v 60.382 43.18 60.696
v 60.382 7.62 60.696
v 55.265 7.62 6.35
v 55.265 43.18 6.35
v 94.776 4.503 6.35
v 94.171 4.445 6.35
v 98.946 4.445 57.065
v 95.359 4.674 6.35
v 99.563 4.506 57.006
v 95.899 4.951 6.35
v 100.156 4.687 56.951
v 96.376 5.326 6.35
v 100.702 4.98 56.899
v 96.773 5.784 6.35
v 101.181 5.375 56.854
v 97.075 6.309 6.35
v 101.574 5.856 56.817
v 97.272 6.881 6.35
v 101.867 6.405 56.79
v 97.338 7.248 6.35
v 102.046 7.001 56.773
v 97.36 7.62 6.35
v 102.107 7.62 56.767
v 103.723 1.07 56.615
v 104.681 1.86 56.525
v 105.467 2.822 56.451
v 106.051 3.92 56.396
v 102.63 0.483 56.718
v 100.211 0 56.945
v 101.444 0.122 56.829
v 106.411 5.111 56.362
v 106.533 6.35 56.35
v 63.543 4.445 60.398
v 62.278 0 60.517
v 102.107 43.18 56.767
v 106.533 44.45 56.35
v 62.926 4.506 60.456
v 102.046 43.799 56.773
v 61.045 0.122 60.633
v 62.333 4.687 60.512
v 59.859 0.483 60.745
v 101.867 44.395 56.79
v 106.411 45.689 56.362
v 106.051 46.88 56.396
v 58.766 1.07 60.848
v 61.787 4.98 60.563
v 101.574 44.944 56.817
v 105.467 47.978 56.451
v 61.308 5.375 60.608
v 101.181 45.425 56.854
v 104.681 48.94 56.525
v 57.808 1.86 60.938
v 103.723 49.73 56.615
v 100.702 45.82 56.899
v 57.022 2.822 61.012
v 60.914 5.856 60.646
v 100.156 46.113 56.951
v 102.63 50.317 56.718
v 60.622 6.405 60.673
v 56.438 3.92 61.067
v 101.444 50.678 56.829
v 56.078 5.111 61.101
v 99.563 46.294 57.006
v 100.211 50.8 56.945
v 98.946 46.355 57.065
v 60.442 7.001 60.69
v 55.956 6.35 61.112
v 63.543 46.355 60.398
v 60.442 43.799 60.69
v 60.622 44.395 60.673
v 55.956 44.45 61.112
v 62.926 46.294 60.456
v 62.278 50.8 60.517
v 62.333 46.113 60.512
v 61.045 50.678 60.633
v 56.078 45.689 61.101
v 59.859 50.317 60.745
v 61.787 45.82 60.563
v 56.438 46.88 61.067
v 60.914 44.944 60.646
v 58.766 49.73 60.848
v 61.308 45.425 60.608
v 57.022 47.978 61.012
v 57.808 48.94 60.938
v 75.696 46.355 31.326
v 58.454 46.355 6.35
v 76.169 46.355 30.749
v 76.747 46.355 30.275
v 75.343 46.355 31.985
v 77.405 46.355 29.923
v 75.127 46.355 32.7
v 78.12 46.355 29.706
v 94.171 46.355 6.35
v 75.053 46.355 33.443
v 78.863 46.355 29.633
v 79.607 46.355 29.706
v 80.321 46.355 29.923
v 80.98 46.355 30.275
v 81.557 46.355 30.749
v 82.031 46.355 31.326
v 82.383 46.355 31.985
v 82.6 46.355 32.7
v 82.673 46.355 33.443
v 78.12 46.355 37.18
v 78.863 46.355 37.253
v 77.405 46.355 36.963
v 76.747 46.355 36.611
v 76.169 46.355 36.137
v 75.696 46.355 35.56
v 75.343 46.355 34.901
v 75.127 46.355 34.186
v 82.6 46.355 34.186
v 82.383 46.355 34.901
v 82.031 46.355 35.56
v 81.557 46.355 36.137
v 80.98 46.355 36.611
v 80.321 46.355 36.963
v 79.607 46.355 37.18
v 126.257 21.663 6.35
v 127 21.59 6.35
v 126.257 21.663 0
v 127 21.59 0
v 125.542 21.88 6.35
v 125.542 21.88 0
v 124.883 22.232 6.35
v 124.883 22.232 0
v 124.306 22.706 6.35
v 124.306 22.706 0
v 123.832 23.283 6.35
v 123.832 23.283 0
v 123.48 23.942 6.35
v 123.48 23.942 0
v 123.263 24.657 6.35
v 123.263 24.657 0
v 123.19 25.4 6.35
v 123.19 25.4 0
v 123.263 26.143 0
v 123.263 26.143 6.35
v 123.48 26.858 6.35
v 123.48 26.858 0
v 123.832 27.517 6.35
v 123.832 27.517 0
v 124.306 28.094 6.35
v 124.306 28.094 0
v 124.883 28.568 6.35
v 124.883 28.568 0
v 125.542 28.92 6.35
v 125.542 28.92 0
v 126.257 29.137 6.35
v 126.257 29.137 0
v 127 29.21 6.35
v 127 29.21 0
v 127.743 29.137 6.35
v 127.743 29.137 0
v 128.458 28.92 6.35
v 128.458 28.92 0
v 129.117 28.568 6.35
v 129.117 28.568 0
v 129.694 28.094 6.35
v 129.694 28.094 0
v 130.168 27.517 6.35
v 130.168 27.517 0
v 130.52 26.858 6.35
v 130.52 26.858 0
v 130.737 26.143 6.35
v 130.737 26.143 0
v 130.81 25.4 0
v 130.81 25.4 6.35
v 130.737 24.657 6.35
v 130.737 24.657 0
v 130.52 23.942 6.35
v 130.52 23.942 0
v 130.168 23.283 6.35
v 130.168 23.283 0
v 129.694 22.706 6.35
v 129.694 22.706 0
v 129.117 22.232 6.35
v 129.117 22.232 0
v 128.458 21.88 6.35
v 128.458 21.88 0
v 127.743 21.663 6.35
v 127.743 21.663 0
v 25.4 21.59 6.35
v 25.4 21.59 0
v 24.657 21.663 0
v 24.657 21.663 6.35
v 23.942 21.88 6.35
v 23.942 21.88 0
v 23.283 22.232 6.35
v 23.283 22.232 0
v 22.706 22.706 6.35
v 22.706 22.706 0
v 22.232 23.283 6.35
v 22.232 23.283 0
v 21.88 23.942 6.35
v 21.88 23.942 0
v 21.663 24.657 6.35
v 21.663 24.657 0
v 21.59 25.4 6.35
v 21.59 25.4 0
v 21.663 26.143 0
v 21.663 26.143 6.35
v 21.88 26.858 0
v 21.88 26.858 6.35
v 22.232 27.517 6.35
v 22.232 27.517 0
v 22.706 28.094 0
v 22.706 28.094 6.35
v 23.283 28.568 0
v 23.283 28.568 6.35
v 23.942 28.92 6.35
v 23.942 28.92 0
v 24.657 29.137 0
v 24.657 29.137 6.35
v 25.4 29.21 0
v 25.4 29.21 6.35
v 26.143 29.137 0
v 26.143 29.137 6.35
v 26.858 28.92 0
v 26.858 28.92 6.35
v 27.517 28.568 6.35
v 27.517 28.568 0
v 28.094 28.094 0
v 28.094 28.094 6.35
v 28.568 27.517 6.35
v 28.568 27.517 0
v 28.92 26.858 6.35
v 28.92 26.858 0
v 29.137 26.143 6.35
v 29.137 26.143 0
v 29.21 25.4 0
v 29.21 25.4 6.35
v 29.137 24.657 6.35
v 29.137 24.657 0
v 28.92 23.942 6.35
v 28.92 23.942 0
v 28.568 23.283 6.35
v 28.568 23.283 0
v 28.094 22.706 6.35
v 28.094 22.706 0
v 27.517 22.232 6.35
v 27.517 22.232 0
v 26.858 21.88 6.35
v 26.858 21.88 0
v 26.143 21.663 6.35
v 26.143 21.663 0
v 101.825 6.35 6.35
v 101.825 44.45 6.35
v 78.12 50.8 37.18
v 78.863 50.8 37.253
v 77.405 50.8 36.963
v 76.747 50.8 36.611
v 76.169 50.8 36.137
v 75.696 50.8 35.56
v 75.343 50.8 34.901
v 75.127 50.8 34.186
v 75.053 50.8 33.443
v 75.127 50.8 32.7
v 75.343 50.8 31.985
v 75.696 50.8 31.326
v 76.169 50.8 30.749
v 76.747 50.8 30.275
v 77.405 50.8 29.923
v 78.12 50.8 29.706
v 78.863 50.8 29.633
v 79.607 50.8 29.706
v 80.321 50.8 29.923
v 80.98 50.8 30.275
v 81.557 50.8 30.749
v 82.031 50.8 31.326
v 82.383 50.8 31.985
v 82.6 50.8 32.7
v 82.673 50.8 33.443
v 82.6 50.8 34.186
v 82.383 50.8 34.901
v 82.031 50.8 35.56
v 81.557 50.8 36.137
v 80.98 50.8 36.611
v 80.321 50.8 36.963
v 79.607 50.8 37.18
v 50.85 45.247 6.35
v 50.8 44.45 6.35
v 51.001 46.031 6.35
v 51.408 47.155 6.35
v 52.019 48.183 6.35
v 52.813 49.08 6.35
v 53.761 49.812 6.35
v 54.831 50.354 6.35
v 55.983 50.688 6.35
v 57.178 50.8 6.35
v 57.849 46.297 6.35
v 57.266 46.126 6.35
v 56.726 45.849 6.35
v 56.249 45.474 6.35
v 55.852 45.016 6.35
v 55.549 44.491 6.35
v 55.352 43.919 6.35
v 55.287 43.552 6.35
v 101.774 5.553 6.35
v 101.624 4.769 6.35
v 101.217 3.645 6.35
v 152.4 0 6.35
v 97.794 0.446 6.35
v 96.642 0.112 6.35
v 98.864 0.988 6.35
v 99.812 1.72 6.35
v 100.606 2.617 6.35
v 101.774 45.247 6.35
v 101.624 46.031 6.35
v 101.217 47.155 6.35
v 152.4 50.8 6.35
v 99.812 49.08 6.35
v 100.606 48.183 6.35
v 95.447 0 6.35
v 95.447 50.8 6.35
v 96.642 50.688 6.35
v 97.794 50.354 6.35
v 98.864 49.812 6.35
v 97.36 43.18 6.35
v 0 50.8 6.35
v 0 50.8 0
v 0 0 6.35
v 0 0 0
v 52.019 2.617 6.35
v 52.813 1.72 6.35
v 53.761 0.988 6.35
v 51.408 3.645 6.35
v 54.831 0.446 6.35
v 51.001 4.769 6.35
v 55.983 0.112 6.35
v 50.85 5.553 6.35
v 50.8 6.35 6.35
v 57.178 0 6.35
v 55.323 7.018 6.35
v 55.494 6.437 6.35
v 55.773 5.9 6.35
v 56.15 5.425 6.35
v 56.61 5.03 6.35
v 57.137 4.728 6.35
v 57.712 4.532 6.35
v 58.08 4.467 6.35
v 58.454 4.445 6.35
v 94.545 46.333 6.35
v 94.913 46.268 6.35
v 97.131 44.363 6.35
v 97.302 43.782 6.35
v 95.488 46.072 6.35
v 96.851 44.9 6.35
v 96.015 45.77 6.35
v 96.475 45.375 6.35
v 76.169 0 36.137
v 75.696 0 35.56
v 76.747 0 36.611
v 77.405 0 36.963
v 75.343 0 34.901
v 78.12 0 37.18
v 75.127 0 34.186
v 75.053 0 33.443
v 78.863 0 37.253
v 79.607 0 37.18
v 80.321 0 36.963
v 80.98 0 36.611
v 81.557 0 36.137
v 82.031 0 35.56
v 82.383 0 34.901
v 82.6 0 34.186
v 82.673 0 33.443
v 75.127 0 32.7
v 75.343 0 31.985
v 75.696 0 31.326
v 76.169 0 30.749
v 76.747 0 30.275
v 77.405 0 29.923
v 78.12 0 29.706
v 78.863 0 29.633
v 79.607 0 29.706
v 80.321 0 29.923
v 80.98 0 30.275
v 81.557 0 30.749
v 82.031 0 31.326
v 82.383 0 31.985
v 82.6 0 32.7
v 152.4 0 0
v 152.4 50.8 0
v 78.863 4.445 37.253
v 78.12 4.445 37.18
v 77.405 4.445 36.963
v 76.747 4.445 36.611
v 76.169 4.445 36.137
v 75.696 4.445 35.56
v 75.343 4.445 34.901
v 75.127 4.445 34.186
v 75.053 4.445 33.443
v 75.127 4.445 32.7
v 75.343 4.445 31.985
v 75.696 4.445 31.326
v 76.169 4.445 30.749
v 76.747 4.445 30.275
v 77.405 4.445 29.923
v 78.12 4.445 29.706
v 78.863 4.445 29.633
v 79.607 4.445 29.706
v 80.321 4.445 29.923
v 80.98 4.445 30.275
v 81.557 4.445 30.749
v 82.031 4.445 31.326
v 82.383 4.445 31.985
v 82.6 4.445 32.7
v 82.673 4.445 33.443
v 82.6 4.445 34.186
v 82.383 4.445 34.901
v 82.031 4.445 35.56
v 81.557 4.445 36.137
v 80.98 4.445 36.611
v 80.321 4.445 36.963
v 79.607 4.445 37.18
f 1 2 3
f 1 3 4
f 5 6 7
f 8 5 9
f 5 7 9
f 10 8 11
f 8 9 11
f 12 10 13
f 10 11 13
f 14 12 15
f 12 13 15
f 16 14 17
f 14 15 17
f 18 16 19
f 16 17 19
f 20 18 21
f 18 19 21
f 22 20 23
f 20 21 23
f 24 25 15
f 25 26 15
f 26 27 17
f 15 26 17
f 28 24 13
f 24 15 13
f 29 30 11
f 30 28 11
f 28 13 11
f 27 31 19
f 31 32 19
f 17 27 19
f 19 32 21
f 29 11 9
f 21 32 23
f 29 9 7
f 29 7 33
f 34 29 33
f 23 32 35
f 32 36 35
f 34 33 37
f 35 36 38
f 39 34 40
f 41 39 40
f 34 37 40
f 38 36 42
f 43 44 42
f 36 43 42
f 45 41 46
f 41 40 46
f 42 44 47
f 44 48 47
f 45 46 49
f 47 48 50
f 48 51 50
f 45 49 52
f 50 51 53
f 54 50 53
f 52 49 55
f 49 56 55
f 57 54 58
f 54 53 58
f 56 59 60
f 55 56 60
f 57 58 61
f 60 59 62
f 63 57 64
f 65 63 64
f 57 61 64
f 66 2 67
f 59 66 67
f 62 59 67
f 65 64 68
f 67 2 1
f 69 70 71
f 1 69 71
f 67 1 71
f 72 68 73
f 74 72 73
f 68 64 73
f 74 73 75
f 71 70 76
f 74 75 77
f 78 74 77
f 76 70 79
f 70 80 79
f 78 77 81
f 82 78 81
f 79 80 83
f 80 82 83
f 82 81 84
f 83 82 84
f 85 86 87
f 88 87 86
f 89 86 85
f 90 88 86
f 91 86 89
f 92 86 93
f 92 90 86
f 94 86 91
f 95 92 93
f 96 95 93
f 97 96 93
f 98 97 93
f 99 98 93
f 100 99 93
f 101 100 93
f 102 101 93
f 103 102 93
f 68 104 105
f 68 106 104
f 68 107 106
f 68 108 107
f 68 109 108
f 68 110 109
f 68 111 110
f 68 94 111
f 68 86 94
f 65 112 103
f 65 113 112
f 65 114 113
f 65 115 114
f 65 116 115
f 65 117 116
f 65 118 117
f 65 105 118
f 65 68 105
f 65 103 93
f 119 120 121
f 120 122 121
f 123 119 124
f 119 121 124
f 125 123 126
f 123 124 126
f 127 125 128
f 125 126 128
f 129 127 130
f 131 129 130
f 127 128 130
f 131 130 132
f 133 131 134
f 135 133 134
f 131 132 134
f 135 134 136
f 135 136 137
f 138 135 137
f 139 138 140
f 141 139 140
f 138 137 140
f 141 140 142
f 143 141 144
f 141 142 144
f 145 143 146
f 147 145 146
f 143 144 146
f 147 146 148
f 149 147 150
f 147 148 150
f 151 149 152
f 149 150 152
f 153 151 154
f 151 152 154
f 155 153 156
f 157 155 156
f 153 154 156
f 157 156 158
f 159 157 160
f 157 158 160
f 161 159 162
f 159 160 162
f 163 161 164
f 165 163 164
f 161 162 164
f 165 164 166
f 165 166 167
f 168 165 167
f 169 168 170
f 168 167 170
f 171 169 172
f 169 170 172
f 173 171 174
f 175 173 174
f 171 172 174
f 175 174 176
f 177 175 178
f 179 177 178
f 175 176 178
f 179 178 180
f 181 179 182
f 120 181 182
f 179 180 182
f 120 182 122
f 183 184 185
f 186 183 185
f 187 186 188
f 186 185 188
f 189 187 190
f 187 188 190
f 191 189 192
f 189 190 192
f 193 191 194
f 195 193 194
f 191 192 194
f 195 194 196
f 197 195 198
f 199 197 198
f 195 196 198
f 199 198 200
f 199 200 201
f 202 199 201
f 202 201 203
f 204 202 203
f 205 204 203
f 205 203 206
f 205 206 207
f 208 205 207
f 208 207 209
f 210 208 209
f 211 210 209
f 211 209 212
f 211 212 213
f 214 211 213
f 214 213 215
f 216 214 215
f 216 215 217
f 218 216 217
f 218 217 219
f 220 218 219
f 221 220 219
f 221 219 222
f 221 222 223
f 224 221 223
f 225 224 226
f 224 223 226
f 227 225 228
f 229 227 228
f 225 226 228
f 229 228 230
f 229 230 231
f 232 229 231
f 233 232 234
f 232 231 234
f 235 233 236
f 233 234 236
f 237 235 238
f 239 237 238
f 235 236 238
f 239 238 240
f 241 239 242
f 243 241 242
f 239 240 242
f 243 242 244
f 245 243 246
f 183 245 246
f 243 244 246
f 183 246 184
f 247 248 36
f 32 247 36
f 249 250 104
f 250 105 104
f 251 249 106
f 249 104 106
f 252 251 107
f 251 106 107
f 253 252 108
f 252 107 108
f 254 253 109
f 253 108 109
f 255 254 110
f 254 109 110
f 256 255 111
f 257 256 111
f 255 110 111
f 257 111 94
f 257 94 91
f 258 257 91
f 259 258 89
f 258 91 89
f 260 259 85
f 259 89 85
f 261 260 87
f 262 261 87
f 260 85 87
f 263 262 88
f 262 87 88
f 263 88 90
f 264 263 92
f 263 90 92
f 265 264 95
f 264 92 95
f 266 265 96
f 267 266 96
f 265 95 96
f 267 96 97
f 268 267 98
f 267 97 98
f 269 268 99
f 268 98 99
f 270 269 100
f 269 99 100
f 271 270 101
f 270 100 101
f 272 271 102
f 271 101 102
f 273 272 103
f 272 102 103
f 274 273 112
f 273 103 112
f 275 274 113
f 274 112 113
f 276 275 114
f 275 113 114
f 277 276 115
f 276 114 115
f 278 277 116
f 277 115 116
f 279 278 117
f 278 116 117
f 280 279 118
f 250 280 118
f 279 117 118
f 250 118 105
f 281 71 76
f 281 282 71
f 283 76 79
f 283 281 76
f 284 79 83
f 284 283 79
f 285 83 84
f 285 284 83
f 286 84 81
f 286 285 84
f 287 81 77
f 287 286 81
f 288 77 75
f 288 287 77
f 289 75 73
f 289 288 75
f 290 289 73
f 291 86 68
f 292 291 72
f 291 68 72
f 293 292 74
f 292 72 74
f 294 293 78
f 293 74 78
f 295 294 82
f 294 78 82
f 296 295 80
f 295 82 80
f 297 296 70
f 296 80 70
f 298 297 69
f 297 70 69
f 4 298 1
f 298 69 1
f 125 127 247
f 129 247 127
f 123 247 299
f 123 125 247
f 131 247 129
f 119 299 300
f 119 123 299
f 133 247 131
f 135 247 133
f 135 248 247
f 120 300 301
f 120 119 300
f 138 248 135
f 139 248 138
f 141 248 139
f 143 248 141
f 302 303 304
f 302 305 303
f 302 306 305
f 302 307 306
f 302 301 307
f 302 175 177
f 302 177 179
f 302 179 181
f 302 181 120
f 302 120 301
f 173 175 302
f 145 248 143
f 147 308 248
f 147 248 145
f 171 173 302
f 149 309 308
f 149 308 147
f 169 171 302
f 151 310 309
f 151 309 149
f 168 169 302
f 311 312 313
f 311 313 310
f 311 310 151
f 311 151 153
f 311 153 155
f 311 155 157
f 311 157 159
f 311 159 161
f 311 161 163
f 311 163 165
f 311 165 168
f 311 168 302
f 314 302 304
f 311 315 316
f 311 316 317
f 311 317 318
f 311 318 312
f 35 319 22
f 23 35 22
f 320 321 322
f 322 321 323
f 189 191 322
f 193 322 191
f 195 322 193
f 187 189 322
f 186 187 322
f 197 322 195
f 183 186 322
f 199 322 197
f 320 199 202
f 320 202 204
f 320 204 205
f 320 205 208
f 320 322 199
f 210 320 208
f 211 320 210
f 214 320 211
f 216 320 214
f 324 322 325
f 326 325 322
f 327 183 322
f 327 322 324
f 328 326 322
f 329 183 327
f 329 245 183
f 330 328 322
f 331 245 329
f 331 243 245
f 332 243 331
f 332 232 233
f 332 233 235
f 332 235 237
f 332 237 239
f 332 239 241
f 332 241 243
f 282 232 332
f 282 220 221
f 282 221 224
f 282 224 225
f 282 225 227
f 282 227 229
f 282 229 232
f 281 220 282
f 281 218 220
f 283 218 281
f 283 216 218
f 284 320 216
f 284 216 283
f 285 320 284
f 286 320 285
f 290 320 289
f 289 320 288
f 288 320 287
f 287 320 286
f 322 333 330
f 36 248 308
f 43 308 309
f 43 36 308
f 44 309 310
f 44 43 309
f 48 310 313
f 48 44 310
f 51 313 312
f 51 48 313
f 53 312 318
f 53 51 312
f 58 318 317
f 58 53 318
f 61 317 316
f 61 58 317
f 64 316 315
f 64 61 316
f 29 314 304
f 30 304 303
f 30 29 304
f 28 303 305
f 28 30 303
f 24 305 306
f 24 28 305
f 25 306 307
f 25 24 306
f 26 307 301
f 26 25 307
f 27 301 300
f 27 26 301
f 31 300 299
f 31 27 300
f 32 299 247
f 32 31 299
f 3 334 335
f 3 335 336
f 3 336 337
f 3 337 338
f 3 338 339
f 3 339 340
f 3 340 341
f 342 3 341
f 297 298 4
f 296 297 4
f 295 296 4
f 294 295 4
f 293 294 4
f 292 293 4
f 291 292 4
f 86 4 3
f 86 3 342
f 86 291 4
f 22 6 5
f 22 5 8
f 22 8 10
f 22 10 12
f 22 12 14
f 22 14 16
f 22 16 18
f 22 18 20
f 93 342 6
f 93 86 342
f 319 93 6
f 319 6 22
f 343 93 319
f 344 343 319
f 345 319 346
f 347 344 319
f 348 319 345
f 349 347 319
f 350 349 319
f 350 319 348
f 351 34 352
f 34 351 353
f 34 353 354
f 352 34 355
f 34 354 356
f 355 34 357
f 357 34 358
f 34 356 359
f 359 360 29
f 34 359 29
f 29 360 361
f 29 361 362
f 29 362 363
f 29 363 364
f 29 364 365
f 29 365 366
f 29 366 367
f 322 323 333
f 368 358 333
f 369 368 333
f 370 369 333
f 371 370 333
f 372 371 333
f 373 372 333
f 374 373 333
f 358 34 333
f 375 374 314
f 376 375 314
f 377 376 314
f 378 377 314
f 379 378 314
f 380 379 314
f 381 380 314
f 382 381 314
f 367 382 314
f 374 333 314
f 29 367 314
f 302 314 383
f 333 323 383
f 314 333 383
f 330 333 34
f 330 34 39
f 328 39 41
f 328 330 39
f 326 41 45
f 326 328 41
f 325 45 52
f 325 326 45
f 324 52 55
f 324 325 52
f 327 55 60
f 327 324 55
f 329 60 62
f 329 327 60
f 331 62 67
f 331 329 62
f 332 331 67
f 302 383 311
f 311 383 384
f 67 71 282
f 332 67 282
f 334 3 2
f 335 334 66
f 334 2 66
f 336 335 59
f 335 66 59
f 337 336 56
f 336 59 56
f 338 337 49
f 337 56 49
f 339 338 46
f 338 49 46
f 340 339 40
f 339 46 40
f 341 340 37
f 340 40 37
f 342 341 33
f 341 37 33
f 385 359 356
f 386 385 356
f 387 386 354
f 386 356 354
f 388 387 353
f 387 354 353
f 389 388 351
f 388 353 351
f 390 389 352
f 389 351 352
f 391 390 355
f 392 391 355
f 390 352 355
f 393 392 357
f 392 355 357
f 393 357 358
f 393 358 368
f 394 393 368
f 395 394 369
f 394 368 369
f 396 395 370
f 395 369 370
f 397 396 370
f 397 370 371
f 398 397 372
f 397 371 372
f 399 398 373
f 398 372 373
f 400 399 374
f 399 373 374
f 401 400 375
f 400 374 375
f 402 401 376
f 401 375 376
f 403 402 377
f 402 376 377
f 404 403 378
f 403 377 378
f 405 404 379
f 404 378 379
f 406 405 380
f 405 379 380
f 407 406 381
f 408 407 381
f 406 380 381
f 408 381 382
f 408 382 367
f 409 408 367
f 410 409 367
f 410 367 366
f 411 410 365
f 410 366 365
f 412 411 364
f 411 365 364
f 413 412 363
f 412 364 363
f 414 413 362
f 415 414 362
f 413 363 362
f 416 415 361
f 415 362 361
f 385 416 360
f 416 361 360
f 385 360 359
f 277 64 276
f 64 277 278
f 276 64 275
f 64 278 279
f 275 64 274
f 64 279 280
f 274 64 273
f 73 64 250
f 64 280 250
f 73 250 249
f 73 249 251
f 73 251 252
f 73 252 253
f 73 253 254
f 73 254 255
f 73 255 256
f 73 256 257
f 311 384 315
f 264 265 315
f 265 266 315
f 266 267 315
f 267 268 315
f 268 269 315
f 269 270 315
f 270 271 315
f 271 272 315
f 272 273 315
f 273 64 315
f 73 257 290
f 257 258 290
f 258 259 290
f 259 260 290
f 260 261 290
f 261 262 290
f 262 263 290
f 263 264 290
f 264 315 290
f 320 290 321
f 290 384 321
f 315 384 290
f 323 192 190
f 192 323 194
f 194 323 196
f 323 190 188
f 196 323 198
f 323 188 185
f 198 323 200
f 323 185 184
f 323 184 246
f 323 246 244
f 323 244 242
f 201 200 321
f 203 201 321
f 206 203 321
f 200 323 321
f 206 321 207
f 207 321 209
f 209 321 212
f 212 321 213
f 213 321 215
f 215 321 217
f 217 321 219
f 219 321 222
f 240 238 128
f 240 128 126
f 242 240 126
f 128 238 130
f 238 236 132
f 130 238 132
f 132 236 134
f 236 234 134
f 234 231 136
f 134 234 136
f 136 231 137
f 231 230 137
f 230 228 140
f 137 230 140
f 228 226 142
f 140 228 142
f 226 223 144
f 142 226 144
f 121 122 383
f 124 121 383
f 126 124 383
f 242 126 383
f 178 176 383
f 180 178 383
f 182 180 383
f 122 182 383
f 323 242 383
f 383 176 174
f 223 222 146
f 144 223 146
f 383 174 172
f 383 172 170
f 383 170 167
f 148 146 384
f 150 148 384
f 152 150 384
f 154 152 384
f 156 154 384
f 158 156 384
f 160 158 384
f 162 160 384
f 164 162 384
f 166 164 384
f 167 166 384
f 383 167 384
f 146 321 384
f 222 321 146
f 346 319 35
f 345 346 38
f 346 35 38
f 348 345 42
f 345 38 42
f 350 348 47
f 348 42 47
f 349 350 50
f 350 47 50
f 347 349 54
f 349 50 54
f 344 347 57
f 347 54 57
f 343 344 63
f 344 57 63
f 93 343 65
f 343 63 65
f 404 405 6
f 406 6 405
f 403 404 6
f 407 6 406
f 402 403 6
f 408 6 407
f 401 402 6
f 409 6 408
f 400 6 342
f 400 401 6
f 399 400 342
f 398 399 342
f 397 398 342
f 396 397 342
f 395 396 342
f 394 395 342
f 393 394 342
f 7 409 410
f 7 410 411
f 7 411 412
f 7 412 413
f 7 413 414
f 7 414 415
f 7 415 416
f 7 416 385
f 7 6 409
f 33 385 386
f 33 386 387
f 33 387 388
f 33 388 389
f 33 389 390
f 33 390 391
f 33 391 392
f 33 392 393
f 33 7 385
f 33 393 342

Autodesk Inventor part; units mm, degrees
ref_plane "YZ Plane" through (0, 0, 0) normal (1, 0, 0) x (0, 1, 0)
ref_plane "XZ Plane" through (0, 0, 0) normal (0, 1, 0) x (-1, 0, 0)
ref_plane "XY Plane" through (0, 0, 0) normal (0, 0, 1) x (1, 0, 0)
sketch "Sketch1" plane through (0, 0, 0) normal (0, 0, 1) x (1, 0, 0)
  line L0 (0, 0) -> (152.4, 0)
  line L1 (152.4, 0) -> (152.4, 50.8)
  line L2 (152.4, 50.8) -> (0, 50.8)
  line L3 (0, 50.8) -> (0, 0)
  dimension "d0" = 50.8
  dimension "d1" = 152.4
extrude "Extrusion1" add sketch "Sketch1" along normal blind 6.35
sketch "Sketch2" plane through (0, 0, 6.35) normal (0, 0, 1) x (1, 0, 0)
  line L0 (0, 0) -> (0, 50.8) projected
  line L1 (152.4, 50.8) -> (152.4, 0) projected
  point P0 (25.4, 25.4)
  point P1 (127, 25.4)
  point P2 (0, 25.4)
  dimension "d4" = 25.4
  dimension "d5" = 25.4
hole "Hole1" at (25.4, 25.4, 6.35) at (127, 25.4, 6.35) direction (0, 0, -1) diameter 7.62 end through all
sketch "Sketch3" plane through (0, 50.8, 0) normal (0, 1, 0) x (1, 0, 0)
  line L0 (0, -6.35) -> (152.4, -6.35) projected
  line L1 (0, 0) -> (0, -6.35) projected
  line L2 (101.8247, -6.35) -> (106.5326, -56.3502)
  line L3 (106.5326, -56.3502) -> (55.9563, -61.1124)
  line L4 (55.9563, -61.1124) -> (50.8, -6.35)
  dimension "d13" = 50.8
  dimension "d14" = 50.8
  dimension "d15" = 54.7624
  dimension "d16" = 5.379
extrude "Extrusion2" add sketch "Sketch3" against normal up to surface (50.8 mm away)
sketch "Sketch4" plane through (106.5326, 0, 56.3502) normal (0.0937434, 0, 0.9955964) x (0.9955964, 0, -0.0937434)
  line L0 (-50.8, 50.8) -> (0, 50.8) projected
  line L1 (-50.8, 50.8) -> (-50.8, 0) projected
  line L2 (-43.18, 46.355) -> (-7.62, 46.355)
  line L3 (-4.445, 43.18) -> (-4.445, 7.62)
  line L4 (-7.62, 4.445) -> (-43.18, 4.445)
  line L5 (-46.355, 7.62) -> (-46.355, 43.18)
  arc A0 (-43.18, 46.355) -> (-46.355, 43.18) centre (-43.18, 43.18) ccw
  arc A1 (-46.355, 7.62) -> (-43.18, 4.445) centre (-43.18, 7.62) ccw
  arc A2 (-7.62, 4.445) -> (-4.445, 7.62) centre (-7.62, 7.62) ccw
  arc A3 (-4.445, 43.18) -> (-7.62, 46.355) centre (-7.62, 43.18) ccw
  point P0 (-100.781, 0)
  point P1 (-25.4, 46.355)
  point P2 (-25.4, 50.8)
  point P3 (-46.355, 25.4)
  point P4 (-50.8, 25.4)
  dimension "d19" = 3.175
  dimension "d20" = 4.445
  dimension "d21" = 4.445
extrude "Extrusion3" cut sketch "Sketch4" against normal up to surface surface through (76.2, 25.4, 6.35) normal (0, 0, 1)
fillet "Fillet1" radius 6.35 4 edges at (53.3782, 50.8, 33.7312) (53.3782, 0, 33.7312) (104.1787, 50.8, 31.3501) (104.1787, 0, 31.3501)
hole "Hole2" at (78.8634, 50.8, 33.4432) direction (0, -1, 0) diameter 7.62 end through all
properties part number "short frame bracket" material "Steel"
